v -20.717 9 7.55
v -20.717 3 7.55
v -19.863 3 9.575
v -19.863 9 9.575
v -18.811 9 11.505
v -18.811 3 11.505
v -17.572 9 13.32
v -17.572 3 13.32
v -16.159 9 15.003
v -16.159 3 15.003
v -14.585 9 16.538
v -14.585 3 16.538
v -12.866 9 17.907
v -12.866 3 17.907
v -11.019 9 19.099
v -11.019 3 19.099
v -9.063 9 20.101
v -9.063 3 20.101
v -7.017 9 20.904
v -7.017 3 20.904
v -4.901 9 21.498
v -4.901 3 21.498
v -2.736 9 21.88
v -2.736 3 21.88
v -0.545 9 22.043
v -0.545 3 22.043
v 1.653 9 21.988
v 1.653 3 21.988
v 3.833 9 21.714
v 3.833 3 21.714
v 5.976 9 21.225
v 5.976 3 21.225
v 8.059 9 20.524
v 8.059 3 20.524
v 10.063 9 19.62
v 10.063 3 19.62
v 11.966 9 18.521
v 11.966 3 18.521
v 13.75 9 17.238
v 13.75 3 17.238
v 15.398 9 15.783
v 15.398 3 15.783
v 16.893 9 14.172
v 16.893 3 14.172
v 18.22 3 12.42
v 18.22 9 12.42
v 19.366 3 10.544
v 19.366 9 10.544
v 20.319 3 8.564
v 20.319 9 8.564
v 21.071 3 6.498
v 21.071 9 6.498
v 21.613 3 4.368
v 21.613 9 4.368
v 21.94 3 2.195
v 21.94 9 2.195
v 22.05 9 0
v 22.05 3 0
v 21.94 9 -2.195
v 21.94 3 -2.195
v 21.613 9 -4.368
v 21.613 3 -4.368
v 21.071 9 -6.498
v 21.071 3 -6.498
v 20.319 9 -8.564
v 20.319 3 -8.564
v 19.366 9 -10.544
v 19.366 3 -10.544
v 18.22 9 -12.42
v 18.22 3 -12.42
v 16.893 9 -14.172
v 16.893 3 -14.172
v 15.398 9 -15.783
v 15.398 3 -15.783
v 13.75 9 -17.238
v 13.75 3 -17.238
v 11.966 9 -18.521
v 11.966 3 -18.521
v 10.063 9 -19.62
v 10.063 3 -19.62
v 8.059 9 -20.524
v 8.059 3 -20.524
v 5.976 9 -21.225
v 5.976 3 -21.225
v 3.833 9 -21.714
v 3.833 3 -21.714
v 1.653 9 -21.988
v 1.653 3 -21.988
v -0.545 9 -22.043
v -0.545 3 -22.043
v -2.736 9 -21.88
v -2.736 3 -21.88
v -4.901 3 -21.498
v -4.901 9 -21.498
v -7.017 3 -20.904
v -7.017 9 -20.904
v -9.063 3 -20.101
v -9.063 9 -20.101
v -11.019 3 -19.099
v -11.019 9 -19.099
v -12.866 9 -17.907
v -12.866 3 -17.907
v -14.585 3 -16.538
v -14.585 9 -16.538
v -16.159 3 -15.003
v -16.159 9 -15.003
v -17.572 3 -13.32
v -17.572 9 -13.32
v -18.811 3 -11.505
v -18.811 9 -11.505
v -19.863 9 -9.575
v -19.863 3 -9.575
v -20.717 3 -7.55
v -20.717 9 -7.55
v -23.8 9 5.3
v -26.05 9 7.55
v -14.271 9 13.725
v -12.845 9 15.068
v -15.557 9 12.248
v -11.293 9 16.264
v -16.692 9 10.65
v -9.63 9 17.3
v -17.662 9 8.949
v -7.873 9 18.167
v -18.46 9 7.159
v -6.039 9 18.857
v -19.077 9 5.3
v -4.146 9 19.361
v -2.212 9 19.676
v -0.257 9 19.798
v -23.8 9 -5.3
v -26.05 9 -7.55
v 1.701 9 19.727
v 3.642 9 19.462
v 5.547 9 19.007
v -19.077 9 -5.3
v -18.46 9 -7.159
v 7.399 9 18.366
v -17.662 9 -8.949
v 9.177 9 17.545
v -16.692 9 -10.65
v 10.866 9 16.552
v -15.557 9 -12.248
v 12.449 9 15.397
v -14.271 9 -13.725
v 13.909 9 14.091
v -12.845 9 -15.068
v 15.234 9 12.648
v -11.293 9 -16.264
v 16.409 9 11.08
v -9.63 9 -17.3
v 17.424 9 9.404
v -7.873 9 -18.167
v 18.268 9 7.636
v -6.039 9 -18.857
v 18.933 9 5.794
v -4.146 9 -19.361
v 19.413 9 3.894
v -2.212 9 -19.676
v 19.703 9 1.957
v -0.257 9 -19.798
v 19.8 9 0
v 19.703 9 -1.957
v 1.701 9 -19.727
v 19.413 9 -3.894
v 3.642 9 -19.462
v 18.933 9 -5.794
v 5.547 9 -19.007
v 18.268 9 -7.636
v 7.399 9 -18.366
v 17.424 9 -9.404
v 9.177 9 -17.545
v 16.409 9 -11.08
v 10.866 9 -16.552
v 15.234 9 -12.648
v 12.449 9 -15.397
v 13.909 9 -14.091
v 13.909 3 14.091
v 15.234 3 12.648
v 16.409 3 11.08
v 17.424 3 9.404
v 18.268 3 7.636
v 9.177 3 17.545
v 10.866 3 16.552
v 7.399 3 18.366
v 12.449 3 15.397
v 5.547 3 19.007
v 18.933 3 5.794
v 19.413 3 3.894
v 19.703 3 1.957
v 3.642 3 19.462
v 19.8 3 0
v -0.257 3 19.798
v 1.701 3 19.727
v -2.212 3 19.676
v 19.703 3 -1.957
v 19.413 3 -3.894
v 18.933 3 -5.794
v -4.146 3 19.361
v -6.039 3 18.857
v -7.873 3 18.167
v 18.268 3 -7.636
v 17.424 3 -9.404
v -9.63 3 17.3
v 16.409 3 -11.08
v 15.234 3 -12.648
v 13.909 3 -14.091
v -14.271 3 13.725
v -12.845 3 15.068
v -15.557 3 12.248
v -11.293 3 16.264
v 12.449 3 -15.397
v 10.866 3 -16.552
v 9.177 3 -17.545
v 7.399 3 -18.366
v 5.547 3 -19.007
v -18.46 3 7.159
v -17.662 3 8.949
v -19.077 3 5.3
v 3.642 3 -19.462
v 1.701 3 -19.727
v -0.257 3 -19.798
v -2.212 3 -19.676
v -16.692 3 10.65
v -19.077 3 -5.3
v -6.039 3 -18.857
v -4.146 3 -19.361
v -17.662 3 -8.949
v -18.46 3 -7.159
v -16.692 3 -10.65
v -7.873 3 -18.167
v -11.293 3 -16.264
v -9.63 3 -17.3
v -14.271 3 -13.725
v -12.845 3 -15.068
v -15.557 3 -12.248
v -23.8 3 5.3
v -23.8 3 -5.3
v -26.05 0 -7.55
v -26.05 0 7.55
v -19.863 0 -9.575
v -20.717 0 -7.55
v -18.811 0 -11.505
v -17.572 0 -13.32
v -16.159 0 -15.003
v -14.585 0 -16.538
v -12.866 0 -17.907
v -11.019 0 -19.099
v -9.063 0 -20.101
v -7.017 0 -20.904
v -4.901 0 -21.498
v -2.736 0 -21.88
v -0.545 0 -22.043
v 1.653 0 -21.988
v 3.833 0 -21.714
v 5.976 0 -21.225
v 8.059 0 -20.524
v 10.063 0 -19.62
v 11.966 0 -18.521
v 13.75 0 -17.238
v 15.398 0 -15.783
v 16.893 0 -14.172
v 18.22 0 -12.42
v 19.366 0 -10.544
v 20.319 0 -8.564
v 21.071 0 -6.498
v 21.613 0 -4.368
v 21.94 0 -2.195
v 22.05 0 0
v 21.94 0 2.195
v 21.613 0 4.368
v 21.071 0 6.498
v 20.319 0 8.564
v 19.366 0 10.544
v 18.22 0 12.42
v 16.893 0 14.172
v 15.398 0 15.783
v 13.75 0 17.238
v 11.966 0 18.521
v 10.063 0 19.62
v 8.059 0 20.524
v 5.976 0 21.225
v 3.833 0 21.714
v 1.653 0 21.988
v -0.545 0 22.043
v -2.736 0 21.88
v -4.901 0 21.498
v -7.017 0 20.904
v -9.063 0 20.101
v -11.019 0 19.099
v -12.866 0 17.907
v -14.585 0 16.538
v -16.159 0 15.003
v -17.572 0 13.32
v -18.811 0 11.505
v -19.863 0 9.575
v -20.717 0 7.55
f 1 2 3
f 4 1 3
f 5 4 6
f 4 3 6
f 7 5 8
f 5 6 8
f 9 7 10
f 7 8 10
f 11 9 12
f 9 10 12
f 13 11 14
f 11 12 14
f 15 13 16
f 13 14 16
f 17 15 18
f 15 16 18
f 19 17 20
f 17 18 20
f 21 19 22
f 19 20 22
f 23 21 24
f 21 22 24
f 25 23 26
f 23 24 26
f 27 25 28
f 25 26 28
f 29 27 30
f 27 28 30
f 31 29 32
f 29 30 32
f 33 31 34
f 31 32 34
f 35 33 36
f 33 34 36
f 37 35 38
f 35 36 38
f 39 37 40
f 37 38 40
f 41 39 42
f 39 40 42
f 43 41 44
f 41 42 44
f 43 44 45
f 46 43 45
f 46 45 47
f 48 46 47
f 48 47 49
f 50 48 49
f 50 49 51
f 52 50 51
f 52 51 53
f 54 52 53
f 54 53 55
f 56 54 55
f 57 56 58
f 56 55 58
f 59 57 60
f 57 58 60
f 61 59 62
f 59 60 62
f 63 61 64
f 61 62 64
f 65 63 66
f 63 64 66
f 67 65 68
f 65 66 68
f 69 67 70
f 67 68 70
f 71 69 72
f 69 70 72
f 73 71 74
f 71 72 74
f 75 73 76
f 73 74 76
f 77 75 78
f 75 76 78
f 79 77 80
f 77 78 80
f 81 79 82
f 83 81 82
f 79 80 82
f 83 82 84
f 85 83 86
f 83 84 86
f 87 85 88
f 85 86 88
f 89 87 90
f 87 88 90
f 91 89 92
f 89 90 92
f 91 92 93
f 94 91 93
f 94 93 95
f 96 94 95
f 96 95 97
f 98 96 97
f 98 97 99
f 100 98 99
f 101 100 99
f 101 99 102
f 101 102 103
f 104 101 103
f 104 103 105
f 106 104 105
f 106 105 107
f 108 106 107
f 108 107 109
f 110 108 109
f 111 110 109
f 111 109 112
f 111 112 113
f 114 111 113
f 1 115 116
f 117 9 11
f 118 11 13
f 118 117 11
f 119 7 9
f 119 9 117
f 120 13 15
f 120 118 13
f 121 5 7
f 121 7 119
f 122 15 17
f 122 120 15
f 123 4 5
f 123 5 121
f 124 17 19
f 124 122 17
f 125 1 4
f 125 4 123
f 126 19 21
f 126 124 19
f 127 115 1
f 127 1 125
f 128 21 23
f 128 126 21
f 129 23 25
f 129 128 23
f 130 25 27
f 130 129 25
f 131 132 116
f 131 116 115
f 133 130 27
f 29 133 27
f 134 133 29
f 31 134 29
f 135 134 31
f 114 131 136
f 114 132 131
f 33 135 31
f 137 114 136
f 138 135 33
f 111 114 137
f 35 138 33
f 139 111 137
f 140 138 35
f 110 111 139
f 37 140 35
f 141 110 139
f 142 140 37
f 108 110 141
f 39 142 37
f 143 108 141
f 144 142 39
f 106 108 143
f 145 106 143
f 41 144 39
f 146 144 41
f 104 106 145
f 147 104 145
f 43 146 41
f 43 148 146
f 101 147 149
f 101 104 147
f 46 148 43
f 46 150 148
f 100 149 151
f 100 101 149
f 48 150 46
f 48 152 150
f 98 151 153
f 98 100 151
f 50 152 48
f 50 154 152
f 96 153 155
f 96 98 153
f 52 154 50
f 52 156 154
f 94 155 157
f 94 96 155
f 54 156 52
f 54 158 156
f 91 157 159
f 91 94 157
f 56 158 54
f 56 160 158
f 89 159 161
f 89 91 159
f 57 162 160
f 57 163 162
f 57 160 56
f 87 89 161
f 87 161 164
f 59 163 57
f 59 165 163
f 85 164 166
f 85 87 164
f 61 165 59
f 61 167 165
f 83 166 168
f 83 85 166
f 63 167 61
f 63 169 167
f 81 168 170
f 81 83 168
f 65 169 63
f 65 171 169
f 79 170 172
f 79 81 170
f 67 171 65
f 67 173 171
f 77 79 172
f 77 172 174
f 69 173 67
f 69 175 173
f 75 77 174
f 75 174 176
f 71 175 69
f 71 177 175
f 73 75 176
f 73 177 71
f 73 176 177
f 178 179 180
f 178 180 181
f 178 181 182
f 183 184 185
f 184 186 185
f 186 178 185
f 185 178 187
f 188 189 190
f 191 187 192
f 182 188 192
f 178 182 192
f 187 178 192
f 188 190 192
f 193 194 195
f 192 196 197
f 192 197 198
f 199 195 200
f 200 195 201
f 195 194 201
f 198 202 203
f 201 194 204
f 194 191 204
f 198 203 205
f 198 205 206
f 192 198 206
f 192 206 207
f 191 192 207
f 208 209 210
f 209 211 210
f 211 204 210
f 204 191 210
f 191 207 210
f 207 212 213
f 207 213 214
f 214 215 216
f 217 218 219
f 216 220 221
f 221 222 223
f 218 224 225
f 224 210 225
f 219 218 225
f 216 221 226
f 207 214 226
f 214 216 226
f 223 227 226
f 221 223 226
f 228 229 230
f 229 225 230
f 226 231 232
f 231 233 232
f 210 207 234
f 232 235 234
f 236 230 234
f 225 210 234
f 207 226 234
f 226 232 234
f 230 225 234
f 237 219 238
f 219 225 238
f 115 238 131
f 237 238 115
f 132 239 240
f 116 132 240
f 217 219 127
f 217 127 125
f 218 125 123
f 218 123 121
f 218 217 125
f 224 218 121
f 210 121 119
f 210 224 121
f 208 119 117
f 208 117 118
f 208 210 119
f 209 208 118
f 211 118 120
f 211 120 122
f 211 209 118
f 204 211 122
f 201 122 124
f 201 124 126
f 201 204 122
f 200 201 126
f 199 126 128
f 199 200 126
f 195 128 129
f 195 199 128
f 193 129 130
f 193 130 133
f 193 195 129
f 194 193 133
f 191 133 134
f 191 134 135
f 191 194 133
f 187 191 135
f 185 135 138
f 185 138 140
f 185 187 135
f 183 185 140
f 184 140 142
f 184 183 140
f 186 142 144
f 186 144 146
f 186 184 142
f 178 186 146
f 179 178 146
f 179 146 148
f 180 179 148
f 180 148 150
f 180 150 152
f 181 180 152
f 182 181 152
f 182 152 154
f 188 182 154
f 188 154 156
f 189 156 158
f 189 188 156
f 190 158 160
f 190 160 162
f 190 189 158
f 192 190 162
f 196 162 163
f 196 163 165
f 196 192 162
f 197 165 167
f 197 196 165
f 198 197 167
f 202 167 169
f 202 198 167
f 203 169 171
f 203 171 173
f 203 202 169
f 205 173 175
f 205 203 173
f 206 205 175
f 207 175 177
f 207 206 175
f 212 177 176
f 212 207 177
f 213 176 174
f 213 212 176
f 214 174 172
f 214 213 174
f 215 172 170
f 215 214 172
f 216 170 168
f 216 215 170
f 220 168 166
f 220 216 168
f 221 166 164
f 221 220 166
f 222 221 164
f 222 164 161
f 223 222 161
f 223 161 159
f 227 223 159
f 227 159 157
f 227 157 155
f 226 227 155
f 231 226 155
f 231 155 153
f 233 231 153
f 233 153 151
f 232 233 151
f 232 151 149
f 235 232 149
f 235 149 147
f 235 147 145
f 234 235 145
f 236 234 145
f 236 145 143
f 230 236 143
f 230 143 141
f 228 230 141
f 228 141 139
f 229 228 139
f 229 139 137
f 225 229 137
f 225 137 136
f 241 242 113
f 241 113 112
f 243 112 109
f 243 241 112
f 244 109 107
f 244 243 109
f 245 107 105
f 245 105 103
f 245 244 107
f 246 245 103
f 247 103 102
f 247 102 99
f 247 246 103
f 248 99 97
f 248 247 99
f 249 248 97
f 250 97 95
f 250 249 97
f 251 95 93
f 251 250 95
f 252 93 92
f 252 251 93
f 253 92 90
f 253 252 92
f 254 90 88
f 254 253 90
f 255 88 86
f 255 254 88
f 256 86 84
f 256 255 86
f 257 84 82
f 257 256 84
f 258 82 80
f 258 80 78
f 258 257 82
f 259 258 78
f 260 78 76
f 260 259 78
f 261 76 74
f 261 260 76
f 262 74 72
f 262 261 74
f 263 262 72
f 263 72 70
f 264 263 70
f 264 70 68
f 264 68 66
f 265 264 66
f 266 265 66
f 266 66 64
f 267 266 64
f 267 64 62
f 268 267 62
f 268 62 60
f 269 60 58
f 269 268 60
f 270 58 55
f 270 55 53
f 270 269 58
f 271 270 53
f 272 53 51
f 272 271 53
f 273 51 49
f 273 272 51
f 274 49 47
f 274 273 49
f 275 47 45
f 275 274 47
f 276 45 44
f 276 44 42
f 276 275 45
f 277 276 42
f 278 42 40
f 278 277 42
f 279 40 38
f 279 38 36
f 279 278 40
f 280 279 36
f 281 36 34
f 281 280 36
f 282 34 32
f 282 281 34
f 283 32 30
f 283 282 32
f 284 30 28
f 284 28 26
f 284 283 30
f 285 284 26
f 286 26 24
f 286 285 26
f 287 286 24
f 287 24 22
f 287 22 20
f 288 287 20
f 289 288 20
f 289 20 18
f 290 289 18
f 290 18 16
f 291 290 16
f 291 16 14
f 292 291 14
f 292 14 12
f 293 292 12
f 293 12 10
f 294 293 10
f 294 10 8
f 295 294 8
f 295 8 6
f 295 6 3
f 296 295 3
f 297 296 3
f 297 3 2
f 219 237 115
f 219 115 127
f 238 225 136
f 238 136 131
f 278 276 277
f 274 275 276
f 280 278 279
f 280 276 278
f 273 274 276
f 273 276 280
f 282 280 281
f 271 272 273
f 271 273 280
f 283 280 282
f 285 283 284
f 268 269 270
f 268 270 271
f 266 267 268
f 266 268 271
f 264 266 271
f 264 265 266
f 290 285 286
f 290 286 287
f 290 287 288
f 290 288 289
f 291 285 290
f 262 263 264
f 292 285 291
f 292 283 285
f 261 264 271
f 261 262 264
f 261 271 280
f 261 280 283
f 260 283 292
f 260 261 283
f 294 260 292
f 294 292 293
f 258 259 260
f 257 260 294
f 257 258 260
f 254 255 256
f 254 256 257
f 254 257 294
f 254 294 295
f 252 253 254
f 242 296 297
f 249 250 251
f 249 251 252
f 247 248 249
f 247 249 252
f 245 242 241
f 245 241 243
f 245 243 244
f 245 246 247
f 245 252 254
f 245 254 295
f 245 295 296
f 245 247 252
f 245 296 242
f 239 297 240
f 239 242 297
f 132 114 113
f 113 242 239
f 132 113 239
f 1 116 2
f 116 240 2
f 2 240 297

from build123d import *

# Parameters (mm, degrees)
EXTRUDE_1_DEPTH = 3
EXTRUDE_2_DEPTH = 6


with BuildPart() as part:
    # 스케치1 → 보스-돌출1 (new body)
    with BuildSketch(Plane(origin=(0, 0, 0), x_dir=(1, 0, 0), z_dir=(0, 1, 0))):
        with BuildLine():
            Line((-26.05, 7.55), (-20.71714266, 7.55))
            ThreePointArc((-20.71714266, 7.55), (22.05, 0), (-20.71714266, -7.55))
            Line((-20.71714266, -7.55), (-26.05, -7.55))
            Line((-26.05, -7.55), (-26.05, 7.55))
        make_face()
    extrude(amount=EXTRUDE_1_DEPTH)

    # 스케치2 → 보스-돌출2 (add)
    with BuildSketch(Plane(origin=(0, 3, 0), x_dir=(1, 0, 0), z_dir=(0, 1, 0))):
        with BuildLine():
            Line((-26.05, 7.55), (-26.05, -7.55))
            Line((-26.05, -7.55), (-20.71714266, -7.55))
            ThreePointArc((-20.71714266, -7.55), (22.05, 0), (-20.71714266, 7.55))
            Line((-20.71714266, 7.55), (-26.05, 7.55))
        make_face()
        with BuildLine():
            Line((-19.077473627, 5.3), (-23.8, 5.3))
            Line((-23.8, 5.3), (-23.8, -5.3))
            Line((-23.8, -5.3), (-19.077473627, -5.3))
            ThreePointArc((-19.077473627, -5.3), (19.8, 0), (-19.077473627, 5.3))
        make_face(mode=Mode.SUBTRACT)
    extrude(amount=EXTRUDE_2_DEPTH)


solid = part.part
